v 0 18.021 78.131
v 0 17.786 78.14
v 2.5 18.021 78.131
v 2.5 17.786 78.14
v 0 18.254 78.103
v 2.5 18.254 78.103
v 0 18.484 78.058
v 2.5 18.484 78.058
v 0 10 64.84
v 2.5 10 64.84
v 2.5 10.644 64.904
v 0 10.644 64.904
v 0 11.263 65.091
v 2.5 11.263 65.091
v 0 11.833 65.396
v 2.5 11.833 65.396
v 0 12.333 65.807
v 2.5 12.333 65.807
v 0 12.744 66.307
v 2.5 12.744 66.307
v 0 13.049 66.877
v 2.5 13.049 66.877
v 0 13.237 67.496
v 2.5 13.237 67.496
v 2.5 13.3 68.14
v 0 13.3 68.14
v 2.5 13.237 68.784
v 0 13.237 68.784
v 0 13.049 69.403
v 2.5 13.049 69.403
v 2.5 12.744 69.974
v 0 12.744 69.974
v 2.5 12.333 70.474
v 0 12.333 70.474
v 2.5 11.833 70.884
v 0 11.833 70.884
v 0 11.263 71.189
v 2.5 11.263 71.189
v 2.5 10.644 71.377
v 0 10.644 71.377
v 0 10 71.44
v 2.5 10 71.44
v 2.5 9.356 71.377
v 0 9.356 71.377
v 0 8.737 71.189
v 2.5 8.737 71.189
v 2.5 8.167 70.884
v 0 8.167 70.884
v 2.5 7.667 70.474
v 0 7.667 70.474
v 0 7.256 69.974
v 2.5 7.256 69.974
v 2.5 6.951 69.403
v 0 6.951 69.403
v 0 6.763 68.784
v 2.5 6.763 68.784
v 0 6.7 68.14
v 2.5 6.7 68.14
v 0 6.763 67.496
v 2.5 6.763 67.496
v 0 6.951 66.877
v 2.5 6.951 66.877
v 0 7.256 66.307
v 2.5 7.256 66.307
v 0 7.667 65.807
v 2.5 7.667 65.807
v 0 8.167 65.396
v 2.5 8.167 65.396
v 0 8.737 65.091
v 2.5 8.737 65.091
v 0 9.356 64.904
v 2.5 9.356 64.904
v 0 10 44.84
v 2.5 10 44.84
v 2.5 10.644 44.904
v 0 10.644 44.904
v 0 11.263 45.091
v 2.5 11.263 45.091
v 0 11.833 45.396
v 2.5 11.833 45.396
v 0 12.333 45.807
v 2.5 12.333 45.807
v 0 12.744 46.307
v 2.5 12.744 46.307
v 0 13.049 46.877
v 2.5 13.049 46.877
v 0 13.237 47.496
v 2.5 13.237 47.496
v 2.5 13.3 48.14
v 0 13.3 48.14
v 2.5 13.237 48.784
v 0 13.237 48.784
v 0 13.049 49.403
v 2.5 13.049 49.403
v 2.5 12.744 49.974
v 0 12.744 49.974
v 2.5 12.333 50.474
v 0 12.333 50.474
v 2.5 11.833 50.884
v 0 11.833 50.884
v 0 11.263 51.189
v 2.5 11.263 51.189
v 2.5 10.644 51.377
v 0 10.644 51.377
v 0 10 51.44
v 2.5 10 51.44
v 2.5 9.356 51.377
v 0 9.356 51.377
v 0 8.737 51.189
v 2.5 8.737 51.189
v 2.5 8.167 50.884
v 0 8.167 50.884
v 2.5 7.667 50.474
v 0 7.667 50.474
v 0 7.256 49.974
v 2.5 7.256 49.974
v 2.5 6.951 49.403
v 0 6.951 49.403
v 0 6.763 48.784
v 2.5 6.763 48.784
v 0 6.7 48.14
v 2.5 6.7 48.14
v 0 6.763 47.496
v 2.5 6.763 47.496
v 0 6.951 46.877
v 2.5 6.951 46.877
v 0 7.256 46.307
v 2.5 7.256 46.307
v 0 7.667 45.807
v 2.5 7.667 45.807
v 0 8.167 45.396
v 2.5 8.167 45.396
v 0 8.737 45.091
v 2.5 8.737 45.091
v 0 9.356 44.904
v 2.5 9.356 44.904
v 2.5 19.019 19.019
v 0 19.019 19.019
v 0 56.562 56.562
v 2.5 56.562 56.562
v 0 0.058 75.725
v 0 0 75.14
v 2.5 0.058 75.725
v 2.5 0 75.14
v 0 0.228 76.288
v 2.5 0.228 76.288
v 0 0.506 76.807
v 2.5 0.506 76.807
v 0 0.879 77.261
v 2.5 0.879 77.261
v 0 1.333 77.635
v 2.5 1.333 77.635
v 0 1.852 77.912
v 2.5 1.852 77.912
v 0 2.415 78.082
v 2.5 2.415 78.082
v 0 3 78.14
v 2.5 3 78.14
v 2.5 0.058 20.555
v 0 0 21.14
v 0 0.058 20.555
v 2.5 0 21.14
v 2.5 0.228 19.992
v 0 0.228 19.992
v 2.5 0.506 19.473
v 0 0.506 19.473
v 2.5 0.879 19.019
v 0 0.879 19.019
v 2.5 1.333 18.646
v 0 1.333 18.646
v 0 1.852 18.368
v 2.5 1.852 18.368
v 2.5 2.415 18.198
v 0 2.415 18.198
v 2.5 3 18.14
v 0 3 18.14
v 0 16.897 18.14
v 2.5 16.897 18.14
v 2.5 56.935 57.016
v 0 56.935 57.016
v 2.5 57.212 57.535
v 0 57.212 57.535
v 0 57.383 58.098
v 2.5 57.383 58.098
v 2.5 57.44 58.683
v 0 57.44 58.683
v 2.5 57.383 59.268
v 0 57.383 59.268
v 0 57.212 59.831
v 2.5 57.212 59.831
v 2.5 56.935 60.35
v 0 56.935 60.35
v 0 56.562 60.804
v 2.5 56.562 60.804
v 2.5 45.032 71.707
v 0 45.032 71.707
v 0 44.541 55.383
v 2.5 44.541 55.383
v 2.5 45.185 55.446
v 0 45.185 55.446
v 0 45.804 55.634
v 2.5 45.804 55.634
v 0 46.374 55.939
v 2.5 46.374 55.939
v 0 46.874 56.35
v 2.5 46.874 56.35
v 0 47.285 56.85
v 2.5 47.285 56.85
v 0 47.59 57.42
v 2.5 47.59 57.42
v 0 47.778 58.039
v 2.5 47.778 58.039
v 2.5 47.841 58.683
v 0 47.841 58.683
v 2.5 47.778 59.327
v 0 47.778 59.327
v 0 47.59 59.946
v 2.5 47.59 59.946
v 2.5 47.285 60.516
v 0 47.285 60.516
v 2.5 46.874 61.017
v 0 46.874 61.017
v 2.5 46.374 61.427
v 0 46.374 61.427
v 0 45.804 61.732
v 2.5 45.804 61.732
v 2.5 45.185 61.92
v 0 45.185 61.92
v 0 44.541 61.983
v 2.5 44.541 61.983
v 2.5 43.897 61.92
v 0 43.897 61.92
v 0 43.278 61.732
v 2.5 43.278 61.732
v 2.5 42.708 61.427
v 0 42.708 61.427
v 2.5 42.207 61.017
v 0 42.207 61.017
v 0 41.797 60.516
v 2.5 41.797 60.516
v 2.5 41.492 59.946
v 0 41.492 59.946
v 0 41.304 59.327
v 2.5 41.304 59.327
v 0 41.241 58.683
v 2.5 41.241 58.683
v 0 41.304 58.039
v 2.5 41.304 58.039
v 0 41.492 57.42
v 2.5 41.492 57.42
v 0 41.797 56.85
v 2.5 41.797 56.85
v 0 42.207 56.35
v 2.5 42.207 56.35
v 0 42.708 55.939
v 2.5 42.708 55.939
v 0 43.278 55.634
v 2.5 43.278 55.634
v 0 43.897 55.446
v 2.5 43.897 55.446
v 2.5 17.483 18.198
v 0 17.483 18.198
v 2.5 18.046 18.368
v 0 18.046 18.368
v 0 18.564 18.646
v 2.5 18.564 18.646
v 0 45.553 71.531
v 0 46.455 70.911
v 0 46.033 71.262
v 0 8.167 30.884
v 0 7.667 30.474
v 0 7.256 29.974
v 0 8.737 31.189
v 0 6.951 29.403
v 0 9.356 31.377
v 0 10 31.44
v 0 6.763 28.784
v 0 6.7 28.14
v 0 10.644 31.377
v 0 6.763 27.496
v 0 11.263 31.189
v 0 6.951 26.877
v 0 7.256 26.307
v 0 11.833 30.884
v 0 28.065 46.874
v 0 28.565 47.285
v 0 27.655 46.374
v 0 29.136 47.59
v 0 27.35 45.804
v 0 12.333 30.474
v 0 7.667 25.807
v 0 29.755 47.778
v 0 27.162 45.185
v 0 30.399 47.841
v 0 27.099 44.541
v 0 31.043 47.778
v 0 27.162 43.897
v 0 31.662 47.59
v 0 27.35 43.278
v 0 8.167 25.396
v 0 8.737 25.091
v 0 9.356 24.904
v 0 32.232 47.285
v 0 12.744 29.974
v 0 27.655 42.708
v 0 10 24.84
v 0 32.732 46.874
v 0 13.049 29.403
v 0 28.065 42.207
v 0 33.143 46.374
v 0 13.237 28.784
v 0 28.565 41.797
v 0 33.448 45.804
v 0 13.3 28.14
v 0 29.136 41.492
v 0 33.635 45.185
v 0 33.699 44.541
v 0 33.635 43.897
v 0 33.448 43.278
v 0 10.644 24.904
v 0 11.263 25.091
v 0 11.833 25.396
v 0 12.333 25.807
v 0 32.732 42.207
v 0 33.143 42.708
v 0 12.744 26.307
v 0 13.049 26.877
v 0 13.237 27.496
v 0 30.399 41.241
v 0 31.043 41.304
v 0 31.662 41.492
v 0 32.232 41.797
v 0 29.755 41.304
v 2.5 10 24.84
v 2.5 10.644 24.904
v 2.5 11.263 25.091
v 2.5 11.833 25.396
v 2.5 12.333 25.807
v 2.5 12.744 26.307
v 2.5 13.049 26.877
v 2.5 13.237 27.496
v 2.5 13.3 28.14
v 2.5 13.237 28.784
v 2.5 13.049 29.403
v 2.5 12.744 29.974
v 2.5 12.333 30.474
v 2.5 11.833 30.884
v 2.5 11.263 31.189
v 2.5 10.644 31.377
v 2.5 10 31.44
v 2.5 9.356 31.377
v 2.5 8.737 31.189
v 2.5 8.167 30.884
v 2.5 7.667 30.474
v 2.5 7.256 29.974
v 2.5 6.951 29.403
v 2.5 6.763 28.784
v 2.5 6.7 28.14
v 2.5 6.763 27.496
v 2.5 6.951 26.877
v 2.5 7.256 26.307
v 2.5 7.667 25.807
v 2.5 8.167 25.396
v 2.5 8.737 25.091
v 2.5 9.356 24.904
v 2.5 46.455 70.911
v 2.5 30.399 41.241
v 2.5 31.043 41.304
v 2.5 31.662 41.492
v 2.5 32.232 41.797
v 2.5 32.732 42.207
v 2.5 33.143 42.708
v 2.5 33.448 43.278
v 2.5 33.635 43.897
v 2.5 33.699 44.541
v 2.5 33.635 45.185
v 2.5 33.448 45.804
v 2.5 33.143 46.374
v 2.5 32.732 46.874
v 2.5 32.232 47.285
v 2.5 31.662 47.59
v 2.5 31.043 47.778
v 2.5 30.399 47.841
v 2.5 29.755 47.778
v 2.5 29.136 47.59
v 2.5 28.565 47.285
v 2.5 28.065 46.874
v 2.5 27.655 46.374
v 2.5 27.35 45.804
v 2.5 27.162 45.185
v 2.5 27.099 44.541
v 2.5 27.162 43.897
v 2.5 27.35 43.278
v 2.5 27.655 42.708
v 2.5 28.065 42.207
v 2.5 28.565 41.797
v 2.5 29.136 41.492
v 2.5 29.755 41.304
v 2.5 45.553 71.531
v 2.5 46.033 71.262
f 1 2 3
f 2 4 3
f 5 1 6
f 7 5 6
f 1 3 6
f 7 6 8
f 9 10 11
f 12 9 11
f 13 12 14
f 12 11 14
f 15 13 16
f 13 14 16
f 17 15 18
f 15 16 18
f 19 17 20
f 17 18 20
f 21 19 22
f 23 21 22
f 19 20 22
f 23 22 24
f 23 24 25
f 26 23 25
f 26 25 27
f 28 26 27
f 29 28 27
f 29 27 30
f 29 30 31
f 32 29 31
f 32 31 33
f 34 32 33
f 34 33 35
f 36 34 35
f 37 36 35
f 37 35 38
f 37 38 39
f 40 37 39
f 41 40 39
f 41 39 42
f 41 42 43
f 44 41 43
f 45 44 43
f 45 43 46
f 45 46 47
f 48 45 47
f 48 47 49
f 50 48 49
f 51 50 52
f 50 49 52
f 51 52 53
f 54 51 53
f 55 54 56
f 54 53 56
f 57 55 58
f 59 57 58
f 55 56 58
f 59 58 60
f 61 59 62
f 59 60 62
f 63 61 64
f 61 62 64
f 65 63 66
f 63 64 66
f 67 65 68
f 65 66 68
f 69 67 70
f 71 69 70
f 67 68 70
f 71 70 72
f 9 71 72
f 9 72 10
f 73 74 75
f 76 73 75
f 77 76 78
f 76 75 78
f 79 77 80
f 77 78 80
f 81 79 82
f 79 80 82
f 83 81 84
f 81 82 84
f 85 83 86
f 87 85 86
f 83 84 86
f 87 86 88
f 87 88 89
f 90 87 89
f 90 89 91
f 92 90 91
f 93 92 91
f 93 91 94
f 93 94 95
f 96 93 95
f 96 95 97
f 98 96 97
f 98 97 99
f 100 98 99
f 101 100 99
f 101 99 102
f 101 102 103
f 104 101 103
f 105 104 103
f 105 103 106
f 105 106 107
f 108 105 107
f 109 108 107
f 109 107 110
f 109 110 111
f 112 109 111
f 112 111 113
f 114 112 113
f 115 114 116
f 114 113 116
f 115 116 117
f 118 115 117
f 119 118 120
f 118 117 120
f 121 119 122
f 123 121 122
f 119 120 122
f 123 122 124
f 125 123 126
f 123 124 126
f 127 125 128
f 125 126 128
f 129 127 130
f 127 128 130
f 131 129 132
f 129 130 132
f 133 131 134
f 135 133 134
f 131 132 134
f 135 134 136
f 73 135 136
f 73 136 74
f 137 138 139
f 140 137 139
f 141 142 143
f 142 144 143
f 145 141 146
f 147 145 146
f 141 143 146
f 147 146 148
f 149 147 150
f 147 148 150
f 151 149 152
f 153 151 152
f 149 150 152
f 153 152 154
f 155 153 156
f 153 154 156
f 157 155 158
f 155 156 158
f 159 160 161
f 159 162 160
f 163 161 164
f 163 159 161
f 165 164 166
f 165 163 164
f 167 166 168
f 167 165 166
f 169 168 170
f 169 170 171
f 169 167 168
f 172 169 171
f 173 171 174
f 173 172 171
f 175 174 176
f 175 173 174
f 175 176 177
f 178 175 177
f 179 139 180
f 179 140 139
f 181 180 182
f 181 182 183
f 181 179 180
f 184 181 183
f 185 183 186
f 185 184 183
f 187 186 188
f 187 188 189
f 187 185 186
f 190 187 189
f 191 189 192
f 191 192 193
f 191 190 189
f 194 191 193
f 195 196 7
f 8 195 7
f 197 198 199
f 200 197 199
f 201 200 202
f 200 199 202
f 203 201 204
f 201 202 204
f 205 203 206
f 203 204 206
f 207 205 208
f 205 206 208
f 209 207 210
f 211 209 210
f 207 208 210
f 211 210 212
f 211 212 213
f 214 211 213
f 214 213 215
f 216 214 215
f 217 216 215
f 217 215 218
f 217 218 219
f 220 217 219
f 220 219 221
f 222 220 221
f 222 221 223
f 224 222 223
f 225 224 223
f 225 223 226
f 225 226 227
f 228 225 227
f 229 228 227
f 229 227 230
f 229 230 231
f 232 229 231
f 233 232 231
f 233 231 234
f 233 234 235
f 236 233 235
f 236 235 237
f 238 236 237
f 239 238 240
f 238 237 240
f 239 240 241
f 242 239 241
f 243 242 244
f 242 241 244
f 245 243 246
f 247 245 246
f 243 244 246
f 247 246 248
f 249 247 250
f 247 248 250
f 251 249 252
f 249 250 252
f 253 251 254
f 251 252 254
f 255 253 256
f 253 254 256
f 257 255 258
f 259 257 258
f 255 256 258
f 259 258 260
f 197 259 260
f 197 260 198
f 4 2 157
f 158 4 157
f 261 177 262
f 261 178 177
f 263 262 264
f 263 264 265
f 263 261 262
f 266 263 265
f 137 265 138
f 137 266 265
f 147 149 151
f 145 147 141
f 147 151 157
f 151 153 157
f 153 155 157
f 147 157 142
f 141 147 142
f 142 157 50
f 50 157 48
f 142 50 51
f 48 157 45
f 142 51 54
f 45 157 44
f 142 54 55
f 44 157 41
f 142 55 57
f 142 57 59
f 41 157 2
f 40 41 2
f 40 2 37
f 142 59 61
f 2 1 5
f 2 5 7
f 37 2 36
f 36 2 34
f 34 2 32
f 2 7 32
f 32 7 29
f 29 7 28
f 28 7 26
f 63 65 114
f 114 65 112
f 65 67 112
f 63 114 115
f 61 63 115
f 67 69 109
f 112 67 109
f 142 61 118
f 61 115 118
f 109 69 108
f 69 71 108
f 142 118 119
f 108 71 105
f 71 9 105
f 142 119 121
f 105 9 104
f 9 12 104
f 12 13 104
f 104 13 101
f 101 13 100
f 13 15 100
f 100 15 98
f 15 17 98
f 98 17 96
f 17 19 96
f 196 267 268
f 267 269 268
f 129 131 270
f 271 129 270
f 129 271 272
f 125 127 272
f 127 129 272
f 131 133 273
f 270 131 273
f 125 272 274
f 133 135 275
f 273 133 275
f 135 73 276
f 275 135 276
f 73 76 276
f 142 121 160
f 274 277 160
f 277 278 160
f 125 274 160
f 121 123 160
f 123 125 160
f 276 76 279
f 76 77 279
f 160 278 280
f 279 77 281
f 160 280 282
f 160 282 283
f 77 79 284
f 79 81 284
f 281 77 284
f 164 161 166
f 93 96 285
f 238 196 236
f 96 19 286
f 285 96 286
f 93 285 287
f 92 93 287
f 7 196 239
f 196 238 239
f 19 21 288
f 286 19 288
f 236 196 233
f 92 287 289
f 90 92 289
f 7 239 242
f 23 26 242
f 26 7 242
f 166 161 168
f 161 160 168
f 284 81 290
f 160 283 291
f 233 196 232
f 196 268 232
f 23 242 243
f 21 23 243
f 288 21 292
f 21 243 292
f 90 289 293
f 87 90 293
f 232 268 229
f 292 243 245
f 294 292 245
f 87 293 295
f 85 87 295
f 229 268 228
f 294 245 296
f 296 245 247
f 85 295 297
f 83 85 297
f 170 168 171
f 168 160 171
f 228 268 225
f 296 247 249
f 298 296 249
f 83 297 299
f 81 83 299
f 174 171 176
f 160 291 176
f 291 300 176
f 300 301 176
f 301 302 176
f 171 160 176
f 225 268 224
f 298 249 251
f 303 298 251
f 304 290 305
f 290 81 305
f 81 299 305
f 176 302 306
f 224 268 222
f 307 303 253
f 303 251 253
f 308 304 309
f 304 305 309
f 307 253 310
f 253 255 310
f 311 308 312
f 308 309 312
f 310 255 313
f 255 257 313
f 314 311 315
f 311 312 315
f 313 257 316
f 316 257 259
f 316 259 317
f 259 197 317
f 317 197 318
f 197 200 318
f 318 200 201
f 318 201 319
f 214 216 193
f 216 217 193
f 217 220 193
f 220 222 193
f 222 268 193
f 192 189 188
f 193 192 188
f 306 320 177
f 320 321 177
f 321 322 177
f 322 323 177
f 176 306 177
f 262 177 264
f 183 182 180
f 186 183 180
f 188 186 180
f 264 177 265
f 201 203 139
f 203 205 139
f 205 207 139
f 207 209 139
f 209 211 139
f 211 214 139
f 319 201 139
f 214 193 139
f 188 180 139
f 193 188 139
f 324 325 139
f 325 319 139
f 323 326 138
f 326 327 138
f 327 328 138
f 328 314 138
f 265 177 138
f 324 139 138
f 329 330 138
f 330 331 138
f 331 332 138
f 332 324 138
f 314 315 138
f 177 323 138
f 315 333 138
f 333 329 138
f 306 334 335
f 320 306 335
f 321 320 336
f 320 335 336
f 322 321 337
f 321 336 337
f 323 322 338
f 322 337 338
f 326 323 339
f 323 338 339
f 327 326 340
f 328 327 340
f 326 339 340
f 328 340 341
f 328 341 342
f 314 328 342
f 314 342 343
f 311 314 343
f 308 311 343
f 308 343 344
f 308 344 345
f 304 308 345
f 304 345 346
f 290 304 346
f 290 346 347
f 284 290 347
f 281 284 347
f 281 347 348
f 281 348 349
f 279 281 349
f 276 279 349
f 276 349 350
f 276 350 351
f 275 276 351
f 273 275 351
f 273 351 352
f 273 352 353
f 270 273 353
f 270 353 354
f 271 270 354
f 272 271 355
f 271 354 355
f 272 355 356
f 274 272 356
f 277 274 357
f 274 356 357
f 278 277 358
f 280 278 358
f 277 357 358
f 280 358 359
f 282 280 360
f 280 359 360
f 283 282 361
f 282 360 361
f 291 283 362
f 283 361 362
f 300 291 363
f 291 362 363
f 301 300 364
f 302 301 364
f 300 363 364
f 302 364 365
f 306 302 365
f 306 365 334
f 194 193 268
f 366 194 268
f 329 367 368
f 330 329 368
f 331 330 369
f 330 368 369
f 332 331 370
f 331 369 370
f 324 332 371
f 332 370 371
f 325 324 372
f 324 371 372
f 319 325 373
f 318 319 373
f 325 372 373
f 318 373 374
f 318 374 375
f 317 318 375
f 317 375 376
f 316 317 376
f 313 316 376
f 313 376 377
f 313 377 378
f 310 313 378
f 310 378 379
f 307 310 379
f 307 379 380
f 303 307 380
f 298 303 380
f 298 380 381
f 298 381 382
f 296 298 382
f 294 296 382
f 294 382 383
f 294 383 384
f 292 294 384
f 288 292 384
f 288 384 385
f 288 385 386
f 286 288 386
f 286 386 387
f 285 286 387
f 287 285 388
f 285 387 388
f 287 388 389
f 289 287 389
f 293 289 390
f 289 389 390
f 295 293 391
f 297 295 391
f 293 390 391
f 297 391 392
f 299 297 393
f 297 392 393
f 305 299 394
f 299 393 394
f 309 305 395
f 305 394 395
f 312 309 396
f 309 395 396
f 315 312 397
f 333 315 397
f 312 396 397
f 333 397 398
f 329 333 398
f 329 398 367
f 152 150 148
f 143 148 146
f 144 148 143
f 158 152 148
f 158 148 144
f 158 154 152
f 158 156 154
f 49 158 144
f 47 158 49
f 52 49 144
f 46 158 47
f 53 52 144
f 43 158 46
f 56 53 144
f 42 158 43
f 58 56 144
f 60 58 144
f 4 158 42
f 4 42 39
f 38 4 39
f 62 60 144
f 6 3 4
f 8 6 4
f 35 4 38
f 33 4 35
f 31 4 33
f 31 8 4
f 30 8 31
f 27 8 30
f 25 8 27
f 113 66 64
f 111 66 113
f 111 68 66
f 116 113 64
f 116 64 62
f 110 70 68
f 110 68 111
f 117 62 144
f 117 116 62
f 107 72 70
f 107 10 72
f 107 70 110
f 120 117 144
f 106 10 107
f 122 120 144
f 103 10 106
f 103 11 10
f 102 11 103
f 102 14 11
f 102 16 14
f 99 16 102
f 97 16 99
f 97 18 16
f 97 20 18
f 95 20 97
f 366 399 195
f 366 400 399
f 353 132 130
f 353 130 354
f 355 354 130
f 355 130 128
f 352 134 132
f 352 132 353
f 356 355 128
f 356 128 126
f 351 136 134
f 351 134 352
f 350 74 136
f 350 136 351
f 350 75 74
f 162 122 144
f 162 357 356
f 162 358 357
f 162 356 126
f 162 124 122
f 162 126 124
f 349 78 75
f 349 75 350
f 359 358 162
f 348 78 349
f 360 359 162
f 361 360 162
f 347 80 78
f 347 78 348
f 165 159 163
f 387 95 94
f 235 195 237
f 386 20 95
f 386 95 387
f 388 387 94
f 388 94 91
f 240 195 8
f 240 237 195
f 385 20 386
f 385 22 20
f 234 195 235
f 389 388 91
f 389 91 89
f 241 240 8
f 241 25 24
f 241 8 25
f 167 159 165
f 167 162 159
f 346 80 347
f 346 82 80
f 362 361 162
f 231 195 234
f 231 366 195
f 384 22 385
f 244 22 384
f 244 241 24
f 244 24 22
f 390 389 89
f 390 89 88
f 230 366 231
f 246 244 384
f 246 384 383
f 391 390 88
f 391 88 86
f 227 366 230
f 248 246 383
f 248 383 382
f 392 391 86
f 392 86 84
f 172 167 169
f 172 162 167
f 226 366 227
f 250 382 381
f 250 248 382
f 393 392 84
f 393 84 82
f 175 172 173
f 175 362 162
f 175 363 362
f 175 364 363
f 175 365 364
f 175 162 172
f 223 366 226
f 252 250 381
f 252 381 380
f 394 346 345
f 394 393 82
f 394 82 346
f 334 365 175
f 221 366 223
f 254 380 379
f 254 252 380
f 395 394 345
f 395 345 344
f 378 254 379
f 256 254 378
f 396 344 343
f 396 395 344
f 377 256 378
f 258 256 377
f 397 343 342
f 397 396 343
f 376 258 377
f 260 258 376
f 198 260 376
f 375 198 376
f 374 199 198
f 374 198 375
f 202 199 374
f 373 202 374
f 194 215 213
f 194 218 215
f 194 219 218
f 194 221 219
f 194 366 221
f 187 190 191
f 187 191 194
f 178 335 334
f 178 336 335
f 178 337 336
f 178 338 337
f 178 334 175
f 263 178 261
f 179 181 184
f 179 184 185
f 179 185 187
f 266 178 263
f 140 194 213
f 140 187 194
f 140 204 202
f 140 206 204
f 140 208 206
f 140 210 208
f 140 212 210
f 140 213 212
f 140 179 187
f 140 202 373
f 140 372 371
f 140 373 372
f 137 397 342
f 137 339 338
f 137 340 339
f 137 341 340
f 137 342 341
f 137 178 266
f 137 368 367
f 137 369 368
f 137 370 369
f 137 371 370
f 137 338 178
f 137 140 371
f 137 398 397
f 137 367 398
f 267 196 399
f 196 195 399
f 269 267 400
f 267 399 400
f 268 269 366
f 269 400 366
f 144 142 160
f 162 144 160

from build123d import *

# Parameters (mm, degrees)
BOSS_EXTRUDE1_DEPTH = 2.5
SKETCH2_R           = 3.3
CUT_EXTRUDE1_DEPTH  = 98.753931239
LPATTERN1_COUNT     = 3
LPATTERN1_PITCH     = 20
SKETCH2_4_R         = 3.3
CUT_EXTRUDE2_DEPTH  = 98.753931239
LPATTERN2_COUNT     = 2
LPATTERN2_PITCH     = 20
FILLET1_R           = 3


with BuildPart() as part:
    # Sketch1 → Boss-Extrude1 (new body)
    with BuildSketch(Plane(origin=(0, 0, 0), x_dir=(0, 0, -1), z_dir=(1, 0, 0))):
        Polygon((-78.140120378, 0), (-18.140120378, 0), (-18.140120378, 18.140120378), (-58.68306962, 58.68306962), (-71.510071751, 45.856067489), (-78.140120378, 18.140120378), align=None)
    extrude(amount=BOSS_EXTRUDE1_DEPTH)

    # Sketch2 → Cut-Extrude1 (cut, through all)
    with BuildSketch(Plane(origin=(2.5, 0, 0), x_dir=(0, 0, -1), z_dir=(1, 0, 0))):
        with Locations((-28.140120378, 10)):
            Circle(SKETCH2_R)
    cut_extrude1 = extrude(amount=-CUT_EXTRUDE1_DEPTH, mode=Mode.SUBTRACT)

    # LPattern1: Cut-Extrude1 ×3
    with Locations(*[(0, 0, i * LPATTERN1_PITCH) for i in range(1, LPATTERN1_COUNT)]):
        add(cut_extrude1, mode=Mode.SUBTRACT)

    # Sketch2<4> → Cut-Extrude2 (cut, through all)
    with BuildSketch(Plane(origin=(2.5, 0, 0), x_dir=(0, 0, -1), z_dir=(1, 0, 0))):
        with Locations((-58.68306962, 44.540933996)):
            Circle(SKETCH2_4_R)
    cut_extrude2 = extrude(amount=-CUT_EXTRUDE2_DEPTH, mode=Mode.SUBTRACT)

    # LPattern2: Cut-Extrude2 ×2
    with Locations(*[Vector(0, -0.7071067811865476, -0.7071067811865476) * (i * LPATTERN2_PITCH) for i in range(1, LPATTERN2_COUNT)]):
        add(cut_extrude2, mode=Mode.SUBTRACT)

    # Fillet1
    fillet1_edges = [part.edges().sort_by_distance(p)[0] for p in [
        (1.25, 0, 18.140120378),
        (1.25, 18.140120378, 18.140120378),
        (1.25, 58.68306962, 58.68306962),
        (1.25, 0, 78.140120378),
        (1.25, 18.140120378, 78.140120378),
        (1.25, 45.856067489, 71.510071751),
    ]]
    fillet(fillet1_edges, radius=FILLET1_R)


solid = part.part
